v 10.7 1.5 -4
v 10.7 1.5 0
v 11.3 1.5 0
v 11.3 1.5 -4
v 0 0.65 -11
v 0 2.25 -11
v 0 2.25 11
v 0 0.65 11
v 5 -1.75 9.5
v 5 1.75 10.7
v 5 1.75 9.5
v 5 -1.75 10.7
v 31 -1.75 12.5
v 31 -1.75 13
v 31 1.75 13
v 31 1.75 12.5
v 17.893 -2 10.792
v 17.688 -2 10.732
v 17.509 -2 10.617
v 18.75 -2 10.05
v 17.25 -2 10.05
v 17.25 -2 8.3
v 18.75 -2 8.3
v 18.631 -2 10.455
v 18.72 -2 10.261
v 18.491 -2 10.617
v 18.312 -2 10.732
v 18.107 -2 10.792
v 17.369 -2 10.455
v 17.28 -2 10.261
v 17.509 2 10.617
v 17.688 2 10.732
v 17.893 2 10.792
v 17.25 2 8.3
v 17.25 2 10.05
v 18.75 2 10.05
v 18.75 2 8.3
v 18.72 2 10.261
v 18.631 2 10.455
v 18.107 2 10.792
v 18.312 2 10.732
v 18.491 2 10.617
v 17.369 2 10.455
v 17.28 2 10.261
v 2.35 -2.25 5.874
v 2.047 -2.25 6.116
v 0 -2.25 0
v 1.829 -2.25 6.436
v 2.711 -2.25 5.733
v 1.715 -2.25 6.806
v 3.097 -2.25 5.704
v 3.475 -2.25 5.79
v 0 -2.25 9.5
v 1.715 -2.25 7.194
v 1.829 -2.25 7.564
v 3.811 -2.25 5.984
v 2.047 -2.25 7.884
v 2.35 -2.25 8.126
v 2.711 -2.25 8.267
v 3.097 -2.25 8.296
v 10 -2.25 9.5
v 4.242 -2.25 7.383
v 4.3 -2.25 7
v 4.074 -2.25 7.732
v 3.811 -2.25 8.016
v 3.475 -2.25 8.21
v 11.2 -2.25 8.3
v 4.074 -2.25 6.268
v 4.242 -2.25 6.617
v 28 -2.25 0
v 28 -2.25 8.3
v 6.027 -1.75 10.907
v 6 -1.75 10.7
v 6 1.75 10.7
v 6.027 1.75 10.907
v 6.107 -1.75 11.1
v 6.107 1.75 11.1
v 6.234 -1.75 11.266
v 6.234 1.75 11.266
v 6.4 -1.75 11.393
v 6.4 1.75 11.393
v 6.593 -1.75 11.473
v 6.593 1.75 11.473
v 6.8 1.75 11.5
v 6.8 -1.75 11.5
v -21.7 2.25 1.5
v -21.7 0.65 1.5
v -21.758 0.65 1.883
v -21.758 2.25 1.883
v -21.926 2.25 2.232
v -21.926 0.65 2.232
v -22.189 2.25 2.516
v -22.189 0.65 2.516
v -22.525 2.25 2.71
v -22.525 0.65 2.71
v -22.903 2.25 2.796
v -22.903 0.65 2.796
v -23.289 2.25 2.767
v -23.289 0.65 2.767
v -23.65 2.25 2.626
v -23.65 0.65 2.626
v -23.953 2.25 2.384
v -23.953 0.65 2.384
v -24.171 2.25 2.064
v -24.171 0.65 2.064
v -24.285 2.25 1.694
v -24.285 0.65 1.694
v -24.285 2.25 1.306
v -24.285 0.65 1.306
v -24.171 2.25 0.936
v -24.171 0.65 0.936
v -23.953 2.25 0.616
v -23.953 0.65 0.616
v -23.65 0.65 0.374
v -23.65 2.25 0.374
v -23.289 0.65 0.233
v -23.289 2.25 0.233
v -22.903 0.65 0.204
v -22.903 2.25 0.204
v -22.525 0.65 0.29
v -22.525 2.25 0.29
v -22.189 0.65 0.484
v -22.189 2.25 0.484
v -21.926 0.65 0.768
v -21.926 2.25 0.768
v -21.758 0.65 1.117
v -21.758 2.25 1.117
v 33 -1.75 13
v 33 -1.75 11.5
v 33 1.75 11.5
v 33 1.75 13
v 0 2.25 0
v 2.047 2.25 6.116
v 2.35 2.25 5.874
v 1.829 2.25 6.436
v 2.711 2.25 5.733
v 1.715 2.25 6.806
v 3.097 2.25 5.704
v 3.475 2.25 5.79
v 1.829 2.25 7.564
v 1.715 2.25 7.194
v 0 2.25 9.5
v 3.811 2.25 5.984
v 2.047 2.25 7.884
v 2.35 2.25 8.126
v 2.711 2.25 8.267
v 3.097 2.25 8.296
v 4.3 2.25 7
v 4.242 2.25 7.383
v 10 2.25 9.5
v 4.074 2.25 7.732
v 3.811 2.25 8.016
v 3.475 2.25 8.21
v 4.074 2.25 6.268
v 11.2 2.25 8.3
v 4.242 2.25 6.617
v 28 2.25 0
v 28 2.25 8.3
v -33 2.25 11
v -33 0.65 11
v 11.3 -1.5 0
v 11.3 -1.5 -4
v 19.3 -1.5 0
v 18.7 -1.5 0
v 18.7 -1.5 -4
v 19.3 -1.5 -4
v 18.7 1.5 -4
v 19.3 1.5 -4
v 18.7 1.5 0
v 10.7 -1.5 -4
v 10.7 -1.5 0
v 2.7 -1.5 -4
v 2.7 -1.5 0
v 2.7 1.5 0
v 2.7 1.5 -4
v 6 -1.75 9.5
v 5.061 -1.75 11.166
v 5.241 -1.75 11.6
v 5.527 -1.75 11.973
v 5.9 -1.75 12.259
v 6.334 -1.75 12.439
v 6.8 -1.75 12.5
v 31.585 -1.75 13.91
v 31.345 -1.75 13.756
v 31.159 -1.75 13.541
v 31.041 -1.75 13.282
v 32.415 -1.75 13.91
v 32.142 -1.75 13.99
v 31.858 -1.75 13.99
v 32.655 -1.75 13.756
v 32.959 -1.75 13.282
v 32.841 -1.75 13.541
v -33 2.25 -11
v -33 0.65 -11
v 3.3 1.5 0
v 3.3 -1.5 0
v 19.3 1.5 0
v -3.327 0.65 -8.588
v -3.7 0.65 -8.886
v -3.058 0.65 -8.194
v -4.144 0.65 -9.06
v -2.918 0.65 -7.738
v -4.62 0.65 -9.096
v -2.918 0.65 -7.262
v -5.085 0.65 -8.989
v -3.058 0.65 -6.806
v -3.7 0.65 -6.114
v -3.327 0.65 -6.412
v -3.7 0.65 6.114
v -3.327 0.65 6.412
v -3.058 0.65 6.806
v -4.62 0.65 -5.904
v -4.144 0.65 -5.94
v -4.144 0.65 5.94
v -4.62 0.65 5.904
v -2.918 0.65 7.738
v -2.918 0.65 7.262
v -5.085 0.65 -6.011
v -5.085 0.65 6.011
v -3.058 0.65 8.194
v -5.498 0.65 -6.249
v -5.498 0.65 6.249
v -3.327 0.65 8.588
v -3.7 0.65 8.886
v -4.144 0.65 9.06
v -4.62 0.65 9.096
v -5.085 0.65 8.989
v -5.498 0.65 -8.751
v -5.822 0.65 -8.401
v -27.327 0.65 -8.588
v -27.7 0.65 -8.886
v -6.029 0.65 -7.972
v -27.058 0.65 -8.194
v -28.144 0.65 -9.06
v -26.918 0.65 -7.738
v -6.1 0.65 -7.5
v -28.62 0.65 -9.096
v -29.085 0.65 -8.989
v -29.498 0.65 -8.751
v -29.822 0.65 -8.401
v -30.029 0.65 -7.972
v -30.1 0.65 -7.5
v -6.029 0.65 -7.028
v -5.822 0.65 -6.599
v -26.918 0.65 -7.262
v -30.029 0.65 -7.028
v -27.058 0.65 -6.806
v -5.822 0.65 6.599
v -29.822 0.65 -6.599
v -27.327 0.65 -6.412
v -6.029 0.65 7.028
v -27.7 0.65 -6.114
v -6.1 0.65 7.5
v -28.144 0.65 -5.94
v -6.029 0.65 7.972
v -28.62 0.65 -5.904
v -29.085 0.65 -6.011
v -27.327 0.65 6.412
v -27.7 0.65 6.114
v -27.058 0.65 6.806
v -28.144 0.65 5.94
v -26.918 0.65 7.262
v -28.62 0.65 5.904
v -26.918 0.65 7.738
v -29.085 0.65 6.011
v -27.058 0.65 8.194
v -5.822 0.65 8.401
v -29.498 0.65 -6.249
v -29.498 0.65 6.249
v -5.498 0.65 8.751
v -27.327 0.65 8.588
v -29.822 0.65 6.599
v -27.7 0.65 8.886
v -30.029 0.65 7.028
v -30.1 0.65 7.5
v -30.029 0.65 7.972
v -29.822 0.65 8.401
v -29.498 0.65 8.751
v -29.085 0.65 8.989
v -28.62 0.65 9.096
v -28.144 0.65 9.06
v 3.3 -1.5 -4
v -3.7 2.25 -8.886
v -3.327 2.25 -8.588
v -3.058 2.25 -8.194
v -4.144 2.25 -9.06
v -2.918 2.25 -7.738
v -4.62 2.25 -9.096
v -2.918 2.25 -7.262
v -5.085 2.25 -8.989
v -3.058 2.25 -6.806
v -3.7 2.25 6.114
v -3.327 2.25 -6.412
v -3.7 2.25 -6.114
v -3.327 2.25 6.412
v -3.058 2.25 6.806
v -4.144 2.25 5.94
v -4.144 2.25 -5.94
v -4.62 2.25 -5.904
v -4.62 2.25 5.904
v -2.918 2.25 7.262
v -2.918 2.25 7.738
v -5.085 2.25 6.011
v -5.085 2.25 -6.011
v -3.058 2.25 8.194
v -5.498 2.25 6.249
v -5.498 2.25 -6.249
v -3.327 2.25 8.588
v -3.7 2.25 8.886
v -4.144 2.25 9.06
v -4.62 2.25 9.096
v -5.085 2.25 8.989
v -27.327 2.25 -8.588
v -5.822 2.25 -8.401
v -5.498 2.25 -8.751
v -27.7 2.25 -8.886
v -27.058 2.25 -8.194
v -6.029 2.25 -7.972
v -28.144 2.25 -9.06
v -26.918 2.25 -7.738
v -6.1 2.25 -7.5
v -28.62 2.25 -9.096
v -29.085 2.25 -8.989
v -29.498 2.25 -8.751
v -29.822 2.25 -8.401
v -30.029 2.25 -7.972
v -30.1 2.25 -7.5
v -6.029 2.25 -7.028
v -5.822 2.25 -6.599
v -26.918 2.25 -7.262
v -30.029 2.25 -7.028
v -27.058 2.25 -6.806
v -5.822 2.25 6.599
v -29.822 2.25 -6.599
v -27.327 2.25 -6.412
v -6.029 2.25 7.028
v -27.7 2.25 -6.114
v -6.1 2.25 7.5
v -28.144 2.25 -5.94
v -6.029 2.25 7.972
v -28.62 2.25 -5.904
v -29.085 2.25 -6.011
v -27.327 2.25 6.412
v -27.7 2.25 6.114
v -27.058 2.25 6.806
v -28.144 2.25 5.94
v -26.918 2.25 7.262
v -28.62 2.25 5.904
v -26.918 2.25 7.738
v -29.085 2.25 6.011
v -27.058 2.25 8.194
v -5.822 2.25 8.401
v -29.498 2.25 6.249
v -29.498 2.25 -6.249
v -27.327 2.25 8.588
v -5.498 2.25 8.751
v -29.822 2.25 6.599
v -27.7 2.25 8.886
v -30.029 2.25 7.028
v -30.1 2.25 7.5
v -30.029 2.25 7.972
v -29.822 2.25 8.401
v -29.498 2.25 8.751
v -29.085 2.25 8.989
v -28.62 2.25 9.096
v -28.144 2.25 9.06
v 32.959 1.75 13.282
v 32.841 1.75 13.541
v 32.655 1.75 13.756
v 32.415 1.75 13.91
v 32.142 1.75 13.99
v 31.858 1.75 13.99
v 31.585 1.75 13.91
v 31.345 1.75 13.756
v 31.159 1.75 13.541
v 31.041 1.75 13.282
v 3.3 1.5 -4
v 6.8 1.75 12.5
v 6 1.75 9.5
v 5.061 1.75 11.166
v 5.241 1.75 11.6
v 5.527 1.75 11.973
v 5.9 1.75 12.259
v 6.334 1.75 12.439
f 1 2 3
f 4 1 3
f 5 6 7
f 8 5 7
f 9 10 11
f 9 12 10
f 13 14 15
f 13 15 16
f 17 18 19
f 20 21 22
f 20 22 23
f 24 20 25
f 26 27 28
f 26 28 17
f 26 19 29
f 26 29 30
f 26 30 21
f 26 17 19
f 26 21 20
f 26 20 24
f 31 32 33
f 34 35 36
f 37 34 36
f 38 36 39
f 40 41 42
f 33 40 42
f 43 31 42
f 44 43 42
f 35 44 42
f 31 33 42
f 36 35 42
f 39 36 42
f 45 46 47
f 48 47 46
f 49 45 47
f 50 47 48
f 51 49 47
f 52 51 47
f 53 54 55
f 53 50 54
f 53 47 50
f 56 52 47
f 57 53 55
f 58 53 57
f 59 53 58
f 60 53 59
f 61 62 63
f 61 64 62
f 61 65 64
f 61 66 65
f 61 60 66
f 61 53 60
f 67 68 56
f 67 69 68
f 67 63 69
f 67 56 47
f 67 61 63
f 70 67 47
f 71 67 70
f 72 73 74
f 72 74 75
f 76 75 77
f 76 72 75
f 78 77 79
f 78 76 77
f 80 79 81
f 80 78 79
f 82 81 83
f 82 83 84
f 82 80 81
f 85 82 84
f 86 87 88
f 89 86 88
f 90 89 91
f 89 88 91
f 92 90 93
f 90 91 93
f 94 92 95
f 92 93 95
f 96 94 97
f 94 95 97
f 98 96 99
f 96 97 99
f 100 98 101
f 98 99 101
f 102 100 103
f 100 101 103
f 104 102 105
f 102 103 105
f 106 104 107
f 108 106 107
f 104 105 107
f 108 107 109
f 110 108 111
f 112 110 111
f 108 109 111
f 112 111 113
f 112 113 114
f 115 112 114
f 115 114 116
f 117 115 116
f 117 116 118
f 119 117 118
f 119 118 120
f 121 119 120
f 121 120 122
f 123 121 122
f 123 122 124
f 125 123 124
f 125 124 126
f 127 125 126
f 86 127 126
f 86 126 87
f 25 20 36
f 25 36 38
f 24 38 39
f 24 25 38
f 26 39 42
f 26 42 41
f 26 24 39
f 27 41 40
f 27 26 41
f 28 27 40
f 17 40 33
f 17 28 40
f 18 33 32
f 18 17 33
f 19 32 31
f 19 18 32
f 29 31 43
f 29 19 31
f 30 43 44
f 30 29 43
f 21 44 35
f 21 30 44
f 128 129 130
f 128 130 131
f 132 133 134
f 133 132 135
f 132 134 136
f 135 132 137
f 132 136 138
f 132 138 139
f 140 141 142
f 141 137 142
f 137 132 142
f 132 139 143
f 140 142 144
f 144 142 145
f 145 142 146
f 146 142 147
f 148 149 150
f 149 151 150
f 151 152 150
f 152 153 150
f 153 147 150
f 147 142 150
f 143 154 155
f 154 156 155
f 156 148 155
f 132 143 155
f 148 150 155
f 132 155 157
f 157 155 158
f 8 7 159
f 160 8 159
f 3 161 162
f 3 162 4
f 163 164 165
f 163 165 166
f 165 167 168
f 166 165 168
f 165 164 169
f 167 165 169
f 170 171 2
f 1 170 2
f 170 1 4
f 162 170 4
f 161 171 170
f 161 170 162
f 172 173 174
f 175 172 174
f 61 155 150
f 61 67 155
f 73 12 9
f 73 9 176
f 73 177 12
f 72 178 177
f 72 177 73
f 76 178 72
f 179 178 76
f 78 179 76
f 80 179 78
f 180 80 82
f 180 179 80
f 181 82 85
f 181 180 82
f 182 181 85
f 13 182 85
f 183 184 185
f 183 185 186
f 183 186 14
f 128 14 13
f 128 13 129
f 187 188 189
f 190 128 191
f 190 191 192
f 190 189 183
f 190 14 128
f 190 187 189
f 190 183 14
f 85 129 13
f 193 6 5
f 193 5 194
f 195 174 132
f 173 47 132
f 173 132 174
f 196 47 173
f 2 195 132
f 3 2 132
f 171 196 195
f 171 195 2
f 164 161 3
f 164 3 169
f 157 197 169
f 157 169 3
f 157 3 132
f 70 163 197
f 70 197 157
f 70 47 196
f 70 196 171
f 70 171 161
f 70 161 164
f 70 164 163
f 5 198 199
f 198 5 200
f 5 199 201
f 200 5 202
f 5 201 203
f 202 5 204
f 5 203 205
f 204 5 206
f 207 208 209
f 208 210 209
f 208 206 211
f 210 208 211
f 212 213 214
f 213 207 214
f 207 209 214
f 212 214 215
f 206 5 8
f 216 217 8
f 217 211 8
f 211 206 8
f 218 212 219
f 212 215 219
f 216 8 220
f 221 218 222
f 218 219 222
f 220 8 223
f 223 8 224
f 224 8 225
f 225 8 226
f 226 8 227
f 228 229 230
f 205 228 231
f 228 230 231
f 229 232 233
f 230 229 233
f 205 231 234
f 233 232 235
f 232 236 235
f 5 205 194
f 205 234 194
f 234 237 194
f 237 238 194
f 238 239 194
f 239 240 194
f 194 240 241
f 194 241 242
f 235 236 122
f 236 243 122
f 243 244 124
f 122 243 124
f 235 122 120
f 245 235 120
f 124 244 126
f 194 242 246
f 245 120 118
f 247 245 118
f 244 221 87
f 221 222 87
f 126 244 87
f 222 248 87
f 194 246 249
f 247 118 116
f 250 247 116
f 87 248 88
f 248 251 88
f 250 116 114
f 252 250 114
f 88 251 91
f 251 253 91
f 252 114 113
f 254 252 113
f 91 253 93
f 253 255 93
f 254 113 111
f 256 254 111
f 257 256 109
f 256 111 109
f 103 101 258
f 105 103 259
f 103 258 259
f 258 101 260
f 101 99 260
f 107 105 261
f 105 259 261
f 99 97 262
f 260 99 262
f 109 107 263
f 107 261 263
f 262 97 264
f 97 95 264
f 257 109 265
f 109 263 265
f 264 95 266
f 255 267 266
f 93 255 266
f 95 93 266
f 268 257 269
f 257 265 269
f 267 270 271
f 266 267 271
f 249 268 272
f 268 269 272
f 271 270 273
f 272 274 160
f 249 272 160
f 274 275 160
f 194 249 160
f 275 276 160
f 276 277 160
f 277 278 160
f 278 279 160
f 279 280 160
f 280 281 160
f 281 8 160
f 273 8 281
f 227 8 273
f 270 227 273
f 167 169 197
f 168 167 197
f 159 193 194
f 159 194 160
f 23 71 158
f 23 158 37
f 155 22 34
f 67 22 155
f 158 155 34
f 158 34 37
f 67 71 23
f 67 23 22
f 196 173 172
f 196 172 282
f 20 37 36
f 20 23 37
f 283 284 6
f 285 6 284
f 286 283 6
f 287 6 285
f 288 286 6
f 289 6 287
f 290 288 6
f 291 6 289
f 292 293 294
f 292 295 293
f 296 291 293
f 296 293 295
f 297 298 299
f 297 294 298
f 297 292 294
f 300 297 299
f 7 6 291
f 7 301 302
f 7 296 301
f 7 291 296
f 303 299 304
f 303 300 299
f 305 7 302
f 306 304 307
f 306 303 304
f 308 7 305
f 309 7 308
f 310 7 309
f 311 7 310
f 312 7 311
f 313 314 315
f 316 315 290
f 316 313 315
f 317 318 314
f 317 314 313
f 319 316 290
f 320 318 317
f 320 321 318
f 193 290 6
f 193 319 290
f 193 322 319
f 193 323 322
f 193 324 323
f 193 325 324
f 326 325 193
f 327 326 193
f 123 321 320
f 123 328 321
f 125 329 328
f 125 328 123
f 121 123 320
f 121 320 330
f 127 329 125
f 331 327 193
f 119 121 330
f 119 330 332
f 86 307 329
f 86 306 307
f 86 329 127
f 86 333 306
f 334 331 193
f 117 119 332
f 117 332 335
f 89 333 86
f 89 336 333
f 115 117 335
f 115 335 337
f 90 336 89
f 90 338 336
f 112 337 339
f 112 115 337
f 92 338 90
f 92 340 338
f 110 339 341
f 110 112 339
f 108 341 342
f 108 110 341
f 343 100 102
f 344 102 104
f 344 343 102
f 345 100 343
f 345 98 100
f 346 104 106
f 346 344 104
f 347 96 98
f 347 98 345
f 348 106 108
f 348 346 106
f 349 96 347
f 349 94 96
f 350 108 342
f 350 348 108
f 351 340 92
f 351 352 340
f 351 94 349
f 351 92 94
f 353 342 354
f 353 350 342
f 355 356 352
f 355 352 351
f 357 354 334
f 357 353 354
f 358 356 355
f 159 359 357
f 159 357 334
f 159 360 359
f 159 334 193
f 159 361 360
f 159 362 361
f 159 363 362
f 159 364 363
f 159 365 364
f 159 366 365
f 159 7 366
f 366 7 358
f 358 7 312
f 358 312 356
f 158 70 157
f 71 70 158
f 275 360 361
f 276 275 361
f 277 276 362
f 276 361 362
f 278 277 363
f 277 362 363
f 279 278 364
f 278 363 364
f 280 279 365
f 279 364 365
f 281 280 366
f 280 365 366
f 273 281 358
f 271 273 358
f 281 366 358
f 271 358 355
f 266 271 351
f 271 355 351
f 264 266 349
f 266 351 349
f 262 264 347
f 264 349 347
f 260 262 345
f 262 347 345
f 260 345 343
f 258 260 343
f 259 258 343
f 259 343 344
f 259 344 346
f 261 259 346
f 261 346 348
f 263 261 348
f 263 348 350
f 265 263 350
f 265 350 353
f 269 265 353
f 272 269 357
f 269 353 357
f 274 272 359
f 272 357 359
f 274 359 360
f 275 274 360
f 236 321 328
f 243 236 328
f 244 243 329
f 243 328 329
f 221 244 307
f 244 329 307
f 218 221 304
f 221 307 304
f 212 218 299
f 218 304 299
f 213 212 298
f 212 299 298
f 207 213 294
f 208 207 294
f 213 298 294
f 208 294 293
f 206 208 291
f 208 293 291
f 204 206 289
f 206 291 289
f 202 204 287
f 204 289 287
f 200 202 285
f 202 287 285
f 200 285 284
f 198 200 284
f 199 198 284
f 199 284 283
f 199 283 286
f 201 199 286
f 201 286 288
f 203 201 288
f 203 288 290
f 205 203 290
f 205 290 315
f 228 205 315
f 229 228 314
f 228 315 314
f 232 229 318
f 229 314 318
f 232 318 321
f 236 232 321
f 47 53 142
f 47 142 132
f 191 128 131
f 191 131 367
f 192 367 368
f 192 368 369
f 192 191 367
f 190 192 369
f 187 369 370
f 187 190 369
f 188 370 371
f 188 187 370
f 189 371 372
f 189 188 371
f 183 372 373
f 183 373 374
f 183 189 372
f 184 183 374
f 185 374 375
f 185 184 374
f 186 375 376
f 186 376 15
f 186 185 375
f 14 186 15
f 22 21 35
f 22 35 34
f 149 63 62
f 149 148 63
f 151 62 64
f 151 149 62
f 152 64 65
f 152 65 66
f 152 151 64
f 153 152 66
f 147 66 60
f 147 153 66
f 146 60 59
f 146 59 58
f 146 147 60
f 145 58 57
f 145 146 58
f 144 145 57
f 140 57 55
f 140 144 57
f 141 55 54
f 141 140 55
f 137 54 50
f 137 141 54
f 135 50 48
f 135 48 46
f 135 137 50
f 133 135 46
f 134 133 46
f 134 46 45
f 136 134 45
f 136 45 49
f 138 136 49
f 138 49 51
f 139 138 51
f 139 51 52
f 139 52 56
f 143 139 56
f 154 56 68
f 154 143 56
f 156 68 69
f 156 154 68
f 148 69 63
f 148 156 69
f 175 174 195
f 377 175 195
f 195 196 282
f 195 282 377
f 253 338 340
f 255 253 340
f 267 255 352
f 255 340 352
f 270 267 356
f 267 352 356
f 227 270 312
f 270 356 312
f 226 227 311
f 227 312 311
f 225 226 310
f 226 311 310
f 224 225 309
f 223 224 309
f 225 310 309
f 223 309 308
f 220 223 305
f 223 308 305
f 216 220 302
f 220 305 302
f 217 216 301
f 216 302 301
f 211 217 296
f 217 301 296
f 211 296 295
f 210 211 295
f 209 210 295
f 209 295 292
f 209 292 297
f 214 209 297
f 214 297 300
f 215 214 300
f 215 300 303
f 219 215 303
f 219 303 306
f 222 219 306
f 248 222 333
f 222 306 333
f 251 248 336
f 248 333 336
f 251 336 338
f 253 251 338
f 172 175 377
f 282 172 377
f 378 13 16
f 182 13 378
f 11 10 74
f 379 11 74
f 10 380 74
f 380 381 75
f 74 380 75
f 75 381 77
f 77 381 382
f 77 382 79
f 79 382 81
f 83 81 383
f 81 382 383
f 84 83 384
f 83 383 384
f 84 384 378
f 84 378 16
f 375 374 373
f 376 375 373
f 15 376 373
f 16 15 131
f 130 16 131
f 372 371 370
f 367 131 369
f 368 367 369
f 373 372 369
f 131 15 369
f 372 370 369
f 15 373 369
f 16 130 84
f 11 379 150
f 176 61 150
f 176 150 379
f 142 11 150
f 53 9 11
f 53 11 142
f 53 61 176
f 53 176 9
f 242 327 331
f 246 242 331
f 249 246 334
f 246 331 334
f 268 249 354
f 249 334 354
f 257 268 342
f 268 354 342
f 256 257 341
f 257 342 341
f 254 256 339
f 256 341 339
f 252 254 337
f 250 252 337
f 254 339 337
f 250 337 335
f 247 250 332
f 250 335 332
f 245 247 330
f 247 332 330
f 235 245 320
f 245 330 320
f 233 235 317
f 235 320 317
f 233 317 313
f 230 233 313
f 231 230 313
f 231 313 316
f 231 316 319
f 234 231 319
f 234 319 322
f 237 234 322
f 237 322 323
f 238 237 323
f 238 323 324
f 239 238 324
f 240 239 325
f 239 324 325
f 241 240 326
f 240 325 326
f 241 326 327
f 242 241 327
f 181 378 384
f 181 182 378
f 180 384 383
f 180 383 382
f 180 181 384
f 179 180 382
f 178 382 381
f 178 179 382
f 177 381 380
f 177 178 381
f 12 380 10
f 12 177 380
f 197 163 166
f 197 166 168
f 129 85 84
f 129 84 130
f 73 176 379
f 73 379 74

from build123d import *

# Parameters (mm, degrees)
F0_R      = 1.3
F1_DEPTH  = 2.25
F3_DEPTH  = 1.75
F5_DEPTH  = 2
F6_W      = 0.6
F6_H      = 3
F7_DEPTH  = 4
F8_W      = 33
F8_H      = 22
F8_R      = 1.6
F9_DEPTH  = 1.6
F10_R     = 1.3
F11_DEPTH = 1.601


with BuildPart() as f1:
    # F0 (on Front) → F1 (new body, symmetric)
    with BuildSketch(Plane.XZ):
        Polygon((11.2, 8.3), (10, 9.5), (0, 9.5), (0, 0), (28, 0), (28, 8.3), align=None)
        with Locations((3, 7)):
            Circle(F0_R, mode=Mode.SUBTRACT)
    extrude(amount=F1_DEPTH, both=True)

    # F2 (on Front) → F3 (join, symmetric)
    with BuildSketch(Plane.XZ):
        with BuildLine():
            Line((5, 10.7), (5, 9.5))
            Line((5, 9.5), (6, 9.5))
            Line((6, 9.5), (6, 10.7))
            ThreePointArc((6, 10.7), (6.234315, 11.265685), (6.8, 11.5))
            Line((6.8, 11.5), (33, 11.5))
            Line((33, 11.5), (33, 13))
            ThreePointArc((33, 13), (32, 14), (31, 13))
            Line((31, 13), (31, 12.5))
            Line((31, 12.5), (6.8, 12.5))
            ThreePointArc((6.8, 12.5), (5.527208, 11.972792), (5, 10.7))
        make_face()
    extrude(amount=F3_DEPTH, both=True)

    # F4 (on Front) → F5 (join, symmetric)
    with BuildSketch(Plane.XZ):
        with BuildLine():
            Line((18.75, 8.3), (18.75, 10.05))
            ThreePointArc((18.75, 10.05), (18, 10.8), (17.25, 10.05))
            Line((17.25, 10.05), (17.25, 8.3))
            Line((17.25, 8.3), (18.75, 8.3))
        make_face()
    extrude(amount=F5_DEPTH, both=True)

    # F6 (on Top) → F7 (join)
    with BuildSketch(Plane.XY):
        with Locations((19, 0)):
            Rectangle(F6_W, F6_H)
        with Locations((11, 0)):
            Rectangle(F6_W, F6_H)
        with Locations((3, 0)):
            Rectangle(F6_W, F6_H)
    extrude(amount=-F7_DEPTH)


with BuildPart() as f9:
    # F8 (on face) → F9 (new body)
    with BuildSketch(Plane(origin=(0, 2.25, 0), x_dir=(-1, 0, 0), z_dir=(0, 1, 0))):
        with Locations((16.5, 0)):
            Rectangle(F8_W, F8_H)
        with Locations((4.5, -7.5)):
            Circle(F8_R, mode=Mode.SUBTRACT)
        with Locations((28.5, -7.5)):
            Circle(F8_R, mode=Mode.SUBTRACT)
        with Locations((4.5, 7.5)):
            Circle(F8_R, mode=Mode.SUBTRACT)
        with Locations((28.5, 7.5)):
            Circle(F8_R, mode=Mode.SUBTRACT)
    extrude(amount=-F9_DEPTH)

    # F10 (on face) → F11 (cut, through all)
    with BuildSketch(Plane.XZ.offset(-0.65)):
        with Locations((-23, 1.5)):
            Circle(F10_R)
    extrude(amount=-F11_DEPTH, mode=Mode.SUBTRACT)


solid = Compound([f1.part, f9.part])
